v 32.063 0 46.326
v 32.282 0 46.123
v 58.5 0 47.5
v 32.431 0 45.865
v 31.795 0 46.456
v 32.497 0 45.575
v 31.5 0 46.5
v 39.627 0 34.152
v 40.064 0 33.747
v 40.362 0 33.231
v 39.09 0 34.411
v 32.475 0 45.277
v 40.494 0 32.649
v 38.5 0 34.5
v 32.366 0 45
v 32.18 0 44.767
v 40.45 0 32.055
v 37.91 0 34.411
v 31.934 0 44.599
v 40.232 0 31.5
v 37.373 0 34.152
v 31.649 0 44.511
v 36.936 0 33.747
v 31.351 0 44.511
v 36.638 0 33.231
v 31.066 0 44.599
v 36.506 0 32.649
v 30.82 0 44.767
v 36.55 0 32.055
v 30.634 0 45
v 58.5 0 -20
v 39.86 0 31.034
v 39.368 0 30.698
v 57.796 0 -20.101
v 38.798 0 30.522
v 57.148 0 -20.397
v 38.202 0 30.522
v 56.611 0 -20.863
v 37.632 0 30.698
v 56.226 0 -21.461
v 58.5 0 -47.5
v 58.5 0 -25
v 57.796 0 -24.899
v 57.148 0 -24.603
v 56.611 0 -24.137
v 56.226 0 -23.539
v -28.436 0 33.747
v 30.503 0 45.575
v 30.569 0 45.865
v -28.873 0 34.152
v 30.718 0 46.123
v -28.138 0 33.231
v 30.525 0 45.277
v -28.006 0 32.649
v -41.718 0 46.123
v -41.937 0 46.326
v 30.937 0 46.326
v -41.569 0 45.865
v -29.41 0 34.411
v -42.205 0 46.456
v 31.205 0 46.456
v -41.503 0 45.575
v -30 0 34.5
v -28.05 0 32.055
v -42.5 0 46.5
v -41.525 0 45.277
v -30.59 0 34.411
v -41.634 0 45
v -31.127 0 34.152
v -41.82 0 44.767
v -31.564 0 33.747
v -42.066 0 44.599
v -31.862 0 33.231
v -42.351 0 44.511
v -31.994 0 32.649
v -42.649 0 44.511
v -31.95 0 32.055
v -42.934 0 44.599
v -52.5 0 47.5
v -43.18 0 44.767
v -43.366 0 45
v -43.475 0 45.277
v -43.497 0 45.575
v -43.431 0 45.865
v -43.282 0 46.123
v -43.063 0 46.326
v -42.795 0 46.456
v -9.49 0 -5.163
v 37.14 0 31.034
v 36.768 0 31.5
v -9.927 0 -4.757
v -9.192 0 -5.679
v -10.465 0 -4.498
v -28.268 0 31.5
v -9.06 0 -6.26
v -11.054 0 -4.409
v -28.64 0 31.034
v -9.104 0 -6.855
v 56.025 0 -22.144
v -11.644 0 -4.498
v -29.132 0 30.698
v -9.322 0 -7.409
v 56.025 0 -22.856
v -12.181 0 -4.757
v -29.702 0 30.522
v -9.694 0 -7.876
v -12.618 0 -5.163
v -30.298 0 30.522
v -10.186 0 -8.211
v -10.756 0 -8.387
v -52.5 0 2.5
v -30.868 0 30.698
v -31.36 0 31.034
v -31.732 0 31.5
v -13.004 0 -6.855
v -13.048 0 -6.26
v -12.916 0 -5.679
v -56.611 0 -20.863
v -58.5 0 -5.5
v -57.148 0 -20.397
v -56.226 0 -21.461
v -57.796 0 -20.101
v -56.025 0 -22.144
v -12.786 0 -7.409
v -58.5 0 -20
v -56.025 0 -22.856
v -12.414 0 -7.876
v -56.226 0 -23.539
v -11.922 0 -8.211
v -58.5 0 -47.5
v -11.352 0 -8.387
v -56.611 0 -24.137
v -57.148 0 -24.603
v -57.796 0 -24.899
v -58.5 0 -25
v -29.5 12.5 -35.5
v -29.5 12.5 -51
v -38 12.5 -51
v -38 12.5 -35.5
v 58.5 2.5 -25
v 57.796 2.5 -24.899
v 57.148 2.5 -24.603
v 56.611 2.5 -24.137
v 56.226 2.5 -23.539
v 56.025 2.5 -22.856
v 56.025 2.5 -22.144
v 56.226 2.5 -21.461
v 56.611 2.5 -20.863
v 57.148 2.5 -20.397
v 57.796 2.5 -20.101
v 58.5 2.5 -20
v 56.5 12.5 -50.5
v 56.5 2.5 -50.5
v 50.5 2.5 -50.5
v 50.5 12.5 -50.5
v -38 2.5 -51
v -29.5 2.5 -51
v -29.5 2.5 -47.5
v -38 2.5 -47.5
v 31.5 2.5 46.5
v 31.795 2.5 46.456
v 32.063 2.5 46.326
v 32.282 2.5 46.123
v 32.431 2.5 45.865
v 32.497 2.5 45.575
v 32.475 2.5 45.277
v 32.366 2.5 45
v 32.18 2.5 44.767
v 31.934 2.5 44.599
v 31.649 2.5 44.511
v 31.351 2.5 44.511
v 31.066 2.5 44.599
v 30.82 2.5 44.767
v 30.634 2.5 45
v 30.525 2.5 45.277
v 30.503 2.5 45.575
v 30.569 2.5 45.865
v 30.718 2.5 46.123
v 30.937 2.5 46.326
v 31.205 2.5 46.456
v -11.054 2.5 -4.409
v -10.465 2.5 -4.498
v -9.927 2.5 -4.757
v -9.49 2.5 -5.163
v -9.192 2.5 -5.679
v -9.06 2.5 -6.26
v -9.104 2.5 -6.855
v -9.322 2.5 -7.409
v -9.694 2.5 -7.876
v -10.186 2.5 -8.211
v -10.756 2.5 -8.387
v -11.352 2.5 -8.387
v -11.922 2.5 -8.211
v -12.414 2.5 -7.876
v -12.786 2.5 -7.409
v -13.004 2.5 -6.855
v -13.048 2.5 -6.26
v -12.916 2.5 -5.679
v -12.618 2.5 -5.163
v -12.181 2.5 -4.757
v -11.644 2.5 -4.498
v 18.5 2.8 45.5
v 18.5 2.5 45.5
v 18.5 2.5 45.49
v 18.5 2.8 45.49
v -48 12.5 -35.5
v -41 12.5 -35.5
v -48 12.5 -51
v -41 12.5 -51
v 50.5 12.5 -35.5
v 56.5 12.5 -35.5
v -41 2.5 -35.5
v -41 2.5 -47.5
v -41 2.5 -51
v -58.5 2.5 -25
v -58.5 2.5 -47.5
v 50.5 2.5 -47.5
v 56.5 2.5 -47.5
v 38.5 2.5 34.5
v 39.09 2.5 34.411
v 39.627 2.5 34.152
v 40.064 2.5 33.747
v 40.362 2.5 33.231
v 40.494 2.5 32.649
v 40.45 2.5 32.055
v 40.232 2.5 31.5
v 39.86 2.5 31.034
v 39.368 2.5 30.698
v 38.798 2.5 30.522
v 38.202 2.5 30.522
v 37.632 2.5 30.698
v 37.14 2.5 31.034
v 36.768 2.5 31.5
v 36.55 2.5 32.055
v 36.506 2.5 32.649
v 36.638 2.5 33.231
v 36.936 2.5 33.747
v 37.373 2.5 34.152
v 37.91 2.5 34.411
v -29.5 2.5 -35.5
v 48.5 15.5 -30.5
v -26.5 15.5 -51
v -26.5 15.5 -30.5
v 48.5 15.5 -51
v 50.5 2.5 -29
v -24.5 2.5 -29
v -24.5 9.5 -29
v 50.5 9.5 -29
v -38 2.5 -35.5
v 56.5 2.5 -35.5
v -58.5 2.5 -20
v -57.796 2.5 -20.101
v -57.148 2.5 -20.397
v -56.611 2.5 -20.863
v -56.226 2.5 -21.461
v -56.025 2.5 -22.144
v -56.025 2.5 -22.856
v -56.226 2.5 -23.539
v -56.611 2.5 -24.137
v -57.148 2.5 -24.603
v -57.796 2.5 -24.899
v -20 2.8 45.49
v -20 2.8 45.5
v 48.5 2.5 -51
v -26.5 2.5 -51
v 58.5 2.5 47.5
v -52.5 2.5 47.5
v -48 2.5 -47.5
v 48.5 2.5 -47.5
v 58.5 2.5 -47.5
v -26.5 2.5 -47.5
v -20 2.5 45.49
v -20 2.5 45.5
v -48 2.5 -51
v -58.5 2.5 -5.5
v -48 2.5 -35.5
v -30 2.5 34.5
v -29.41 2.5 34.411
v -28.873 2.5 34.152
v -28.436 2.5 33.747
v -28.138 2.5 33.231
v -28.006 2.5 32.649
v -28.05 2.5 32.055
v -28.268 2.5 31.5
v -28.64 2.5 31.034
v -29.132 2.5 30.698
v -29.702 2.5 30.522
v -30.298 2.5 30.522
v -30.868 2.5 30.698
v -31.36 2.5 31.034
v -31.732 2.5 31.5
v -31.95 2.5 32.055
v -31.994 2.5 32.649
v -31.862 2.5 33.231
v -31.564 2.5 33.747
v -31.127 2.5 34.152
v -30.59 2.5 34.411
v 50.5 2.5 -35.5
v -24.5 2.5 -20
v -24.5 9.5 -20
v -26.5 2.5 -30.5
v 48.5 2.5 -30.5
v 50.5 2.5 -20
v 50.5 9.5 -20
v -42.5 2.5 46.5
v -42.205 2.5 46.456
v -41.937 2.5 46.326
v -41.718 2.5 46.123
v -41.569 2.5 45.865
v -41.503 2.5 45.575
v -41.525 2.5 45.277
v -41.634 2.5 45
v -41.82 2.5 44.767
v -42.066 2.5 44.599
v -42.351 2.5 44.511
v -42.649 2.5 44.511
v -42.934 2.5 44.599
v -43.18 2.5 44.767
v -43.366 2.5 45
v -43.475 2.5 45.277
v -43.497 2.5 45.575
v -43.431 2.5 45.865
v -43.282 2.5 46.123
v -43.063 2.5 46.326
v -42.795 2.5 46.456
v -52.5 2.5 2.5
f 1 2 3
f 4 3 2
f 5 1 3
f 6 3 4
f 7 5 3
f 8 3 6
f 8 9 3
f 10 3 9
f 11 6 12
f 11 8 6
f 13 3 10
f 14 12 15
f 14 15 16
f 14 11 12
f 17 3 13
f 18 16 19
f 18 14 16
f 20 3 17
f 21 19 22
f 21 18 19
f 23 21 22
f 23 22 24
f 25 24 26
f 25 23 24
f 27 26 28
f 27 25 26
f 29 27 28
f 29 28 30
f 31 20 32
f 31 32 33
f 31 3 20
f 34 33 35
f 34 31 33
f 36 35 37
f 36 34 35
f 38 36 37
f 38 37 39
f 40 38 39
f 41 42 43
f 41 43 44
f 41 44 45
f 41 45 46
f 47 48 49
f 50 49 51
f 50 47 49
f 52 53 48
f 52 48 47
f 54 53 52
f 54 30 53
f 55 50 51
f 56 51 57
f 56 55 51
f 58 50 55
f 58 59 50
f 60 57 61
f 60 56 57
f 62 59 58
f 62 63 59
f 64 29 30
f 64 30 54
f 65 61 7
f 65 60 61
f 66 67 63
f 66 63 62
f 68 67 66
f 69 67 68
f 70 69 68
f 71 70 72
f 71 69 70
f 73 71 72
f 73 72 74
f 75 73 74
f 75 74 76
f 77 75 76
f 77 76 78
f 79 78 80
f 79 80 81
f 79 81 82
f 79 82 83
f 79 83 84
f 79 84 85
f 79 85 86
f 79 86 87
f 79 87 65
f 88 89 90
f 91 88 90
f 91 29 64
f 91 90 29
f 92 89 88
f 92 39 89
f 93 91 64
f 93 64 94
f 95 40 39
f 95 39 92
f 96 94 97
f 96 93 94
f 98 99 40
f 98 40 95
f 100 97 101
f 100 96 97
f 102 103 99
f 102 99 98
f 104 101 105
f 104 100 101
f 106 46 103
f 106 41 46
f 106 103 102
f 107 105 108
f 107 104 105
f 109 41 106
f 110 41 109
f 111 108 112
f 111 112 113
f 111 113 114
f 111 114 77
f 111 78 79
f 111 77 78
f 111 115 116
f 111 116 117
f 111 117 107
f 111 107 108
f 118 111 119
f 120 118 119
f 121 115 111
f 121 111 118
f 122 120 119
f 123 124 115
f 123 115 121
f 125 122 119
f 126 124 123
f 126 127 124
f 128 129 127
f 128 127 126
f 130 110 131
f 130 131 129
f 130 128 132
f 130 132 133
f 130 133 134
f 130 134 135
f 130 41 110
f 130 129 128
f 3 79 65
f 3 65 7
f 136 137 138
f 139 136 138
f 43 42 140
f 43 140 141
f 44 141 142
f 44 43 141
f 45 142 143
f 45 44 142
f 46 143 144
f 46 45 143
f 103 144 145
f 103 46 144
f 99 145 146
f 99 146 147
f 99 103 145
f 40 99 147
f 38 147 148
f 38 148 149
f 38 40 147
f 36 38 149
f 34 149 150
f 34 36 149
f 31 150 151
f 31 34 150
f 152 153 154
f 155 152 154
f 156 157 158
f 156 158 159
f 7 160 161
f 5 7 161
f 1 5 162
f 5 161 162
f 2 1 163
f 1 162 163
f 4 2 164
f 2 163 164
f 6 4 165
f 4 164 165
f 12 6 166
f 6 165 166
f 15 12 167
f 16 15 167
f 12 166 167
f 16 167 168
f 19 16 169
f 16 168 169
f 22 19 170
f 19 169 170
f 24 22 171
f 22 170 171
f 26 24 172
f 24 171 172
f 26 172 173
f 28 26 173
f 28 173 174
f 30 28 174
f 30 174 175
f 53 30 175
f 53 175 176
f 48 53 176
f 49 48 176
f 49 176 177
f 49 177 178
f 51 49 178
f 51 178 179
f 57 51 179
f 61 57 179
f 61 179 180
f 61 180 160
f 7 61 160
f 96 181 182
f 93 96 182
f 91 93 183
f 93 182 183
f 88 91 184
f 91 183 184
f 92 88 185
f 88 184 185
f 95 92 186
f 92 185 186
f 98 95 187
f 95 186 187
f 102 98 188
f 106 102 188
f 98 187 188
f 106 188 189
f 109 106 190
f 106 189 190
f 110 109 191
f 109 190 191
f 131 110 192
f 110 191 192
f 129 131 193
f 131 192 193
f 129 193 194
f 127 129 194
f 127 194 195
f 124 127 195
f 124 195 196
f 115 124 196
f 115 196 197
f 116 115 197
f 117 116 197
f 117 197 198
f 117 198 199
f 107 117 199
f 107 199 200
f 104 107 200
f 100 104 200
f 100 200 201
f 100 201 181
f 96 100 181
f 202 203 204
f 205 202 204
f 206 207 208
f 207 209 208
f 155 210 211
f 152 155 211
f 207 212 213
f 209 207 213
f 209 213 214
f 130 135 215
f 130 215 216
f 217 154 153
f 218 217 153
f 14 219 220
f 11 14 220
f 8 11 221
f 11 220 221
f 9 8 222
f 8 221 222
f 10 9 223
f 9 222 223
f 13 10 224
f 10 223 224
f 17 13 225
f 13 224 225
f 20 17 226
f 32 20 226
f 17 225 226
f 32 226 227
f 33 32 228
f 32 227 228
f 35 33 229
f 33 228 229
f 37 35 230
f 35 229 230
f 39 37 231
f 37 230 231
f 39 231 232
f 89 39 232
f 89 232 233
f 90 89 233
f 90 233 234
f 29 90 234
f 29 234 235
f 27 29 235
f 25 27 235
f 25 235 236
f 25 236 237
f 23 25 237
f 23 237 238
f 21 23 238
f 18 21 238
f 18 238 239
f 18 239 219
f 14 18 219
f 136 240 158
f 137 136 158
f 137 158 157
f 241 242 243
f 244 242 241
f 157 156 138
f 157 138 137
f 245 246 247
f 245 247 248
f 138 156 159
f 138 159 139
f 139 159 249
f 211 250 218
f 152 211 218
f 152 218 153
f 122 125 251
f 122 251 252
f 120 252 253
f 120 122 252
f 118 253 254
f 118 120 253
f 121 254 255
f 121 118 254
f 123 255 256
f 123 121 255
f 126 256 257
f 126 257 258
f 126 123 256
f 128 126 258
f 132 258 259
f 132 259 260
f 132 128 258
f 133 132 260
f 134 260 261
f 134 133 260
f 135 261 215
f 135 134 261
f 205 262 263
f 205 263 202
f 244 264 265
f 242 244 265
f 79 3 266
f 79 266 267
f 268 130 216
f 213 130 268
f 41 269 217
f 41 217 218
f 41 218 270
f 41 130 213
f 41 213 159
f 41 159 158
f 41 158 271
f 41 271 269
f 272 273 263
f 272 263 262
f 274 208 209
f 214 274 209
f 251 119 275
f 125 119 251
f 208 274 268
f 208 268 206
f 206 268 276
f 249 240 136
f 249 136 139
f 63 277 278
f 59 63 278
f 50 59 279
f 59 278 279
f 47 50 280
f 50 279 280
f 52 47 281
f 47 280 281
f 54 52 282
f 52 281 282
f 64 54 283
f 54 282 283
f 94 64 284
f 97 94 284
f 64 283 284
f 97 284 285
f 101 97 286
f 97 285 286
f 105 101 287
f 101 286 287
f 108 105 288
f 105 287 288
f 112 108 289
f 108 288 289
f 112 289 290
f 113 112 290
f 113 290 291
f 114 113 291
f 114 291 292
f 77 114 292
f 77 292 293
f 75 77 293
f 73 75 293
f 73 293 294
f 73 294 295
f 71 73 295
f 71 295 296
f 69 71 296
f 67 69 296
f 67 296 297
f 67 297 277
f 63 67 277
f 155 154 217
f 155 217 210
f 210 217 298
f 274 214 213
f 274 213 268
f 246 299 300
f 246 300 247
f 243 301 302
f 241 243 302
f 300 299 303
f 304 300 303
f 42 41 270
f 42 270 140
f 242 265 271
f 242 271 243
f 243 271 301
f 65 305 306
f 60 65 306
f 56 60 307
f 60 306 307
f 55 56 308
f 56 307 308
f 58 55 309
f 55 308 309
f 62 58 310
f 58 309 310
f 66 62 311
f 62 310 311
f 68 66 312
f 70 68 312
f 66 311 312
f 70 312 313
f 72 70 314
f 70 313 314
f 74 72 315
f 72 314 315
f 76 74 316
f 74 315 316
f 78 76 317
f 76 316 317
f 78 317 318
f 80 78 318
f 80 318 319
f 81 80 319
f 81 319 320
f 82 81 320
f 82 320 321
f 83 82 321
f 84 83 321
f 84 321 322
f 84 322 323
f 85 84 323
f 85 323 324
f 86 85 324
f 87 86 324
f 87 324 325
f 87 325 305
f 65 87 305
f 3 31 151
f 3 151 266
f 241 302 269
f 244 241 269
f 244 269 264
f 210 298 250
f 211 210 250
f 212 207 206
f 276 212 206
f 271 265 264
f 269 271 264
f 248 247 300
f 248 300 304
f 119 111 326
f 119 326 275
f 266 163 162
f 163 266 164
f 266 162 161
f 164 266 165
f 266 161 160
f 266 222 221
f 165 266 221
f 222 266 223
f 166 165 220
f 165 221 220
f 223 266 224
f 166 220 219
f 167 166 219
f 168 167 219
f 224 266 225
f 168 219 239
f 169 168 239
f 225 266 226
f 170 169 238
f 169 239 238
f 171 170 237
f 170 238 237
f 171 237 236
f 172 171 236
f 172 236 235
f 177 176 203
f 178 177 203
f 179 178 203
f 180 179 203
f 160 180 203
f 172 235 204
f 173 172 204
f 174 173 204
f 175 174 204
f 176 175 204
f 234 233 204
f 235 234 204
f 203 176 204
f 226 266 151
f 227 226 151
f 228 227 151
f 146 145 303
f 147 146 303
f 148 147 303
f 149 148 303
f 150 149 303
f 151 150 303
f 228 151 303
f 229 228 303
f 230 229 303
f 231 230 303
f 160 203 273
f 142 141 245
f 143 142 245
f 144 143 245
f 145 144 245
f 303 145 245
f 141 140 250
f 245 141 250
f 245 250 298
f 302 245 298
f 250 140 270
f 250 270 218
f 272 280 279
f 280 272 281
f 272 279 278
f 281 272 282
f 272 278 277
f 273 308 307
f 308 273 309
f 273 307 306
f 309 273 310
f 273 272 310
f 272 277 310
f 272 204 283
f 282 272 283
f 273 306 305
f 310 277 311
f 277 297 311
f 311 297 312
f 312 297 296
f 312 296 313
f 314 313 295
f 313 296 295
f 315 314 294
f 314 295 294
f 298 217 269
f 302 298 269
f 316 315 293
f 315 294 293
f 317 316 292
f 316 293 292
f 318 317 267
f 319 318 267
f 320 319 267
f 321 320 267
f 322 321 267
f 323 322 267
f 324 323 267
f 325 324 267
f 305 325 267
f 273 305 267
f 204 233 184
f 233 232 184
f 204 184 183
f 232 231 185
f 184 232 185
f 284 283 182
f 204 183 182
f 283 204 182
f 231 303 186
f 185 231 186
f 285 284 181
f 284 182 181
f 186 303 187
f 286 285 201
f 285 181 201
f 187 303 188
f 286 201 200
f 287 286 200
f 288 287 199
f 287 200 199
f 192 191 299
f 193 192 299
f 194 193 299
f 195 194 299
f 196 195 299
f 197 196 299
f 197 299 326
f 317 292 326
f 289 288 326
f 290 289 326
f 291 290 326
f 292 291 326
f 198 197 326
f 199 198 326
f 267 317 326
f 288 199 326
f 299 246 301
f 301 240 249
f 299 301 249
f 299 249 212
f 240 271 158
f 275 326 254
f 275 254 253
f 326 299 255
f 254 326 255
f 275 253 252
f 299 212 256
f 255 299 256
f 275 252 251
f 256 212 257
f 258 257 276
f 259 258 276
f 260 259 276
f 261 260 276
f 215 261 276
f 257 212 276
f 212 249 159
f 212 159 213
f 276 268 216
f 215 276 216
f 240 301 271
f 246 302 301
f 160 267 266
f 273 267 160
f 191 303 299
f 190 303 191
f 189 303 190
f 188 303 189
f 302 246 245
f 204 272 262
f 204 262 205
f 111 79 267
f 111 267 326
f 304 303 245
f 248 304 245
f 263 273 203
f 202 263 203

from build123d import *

# Parameters (mm, degrees)
BOSS_EXTRUDE1_DEPTH = 2.5
SKETCH2_R           = 2
SKETCH2_R_2         = 1
CUT_EXTRUDE1_DEPTH  = 5
BOSS_EXTRUDE2_DEPTH = 13
SKETCH6_W           = 75
SKETCH6_H           = 9
BOSS_EXTRUDE3_DEPTH = 7
BOSS_EXTRUDE4_DEPTH = 10
SKETCH8_W           = 38.5
SKETCH8_H           = 0.01
BOSS_EXTRUDE5_DEPTH = 0.3


with BuildPart() as part:
    # Sketch1 → Boss-Extrude1 (new body)
    with BuildSketch(Plane(origin=(0, 0, 0), x_dir=(1, 0, 0), z_dir=(0, 1, 0))):
        with BuildLine():
            Line((-58.5, 47.5), (58.5, 47.5))
            Line((58.5, 47.5), (58.5, 25))
            ThreePointArc((58.5, 25), (56, 22.5), (58.5, 20))
            Line((58.5, 20), (58.5, -47.5))
            Line((58.5, -47.5), (-52.5, -47.5))
            Line((-52.5, -47.5), (-52.5, -2.5))
            Line((-52.5, -2.5), (-58.5, 5.5))
            Line((-58.5, 5.5), (-58.5, 20))
            ThreePointArc((-58.5, 20), (-56, 22.5), (-58.5, 25))
            Line((-58.5, 25), (-58.5, 47.5))
        make_face()
    extrude(amount=BOSS_EXTRUDE1_DEPTH)

    # Sketch2 → Cut-Extrude1 (cut)
    with BuildSketch(Plane(origin=(0, 2.5, 0), x_dir=(1, 0, 0), z_dir=(0, 1, 0))):
        with Locations(Location((-11.054054054, 6.409494198, 0), (0, 0, 270))):
            Circle(SKETCH2_R)
        with Locations(Location((-30, -32.5, 0), (0, 0, 270))):
            Circle(SKETCH2_R)
        with Locations(Location((38.5, -32.5, 0), (0, 0, 270))):
            Circle(SKETCH2_R)
        with Locations(Location((-42.5, -45.5, 0), (0, 0, 270))):
            Circle(SKETCH2_R_2)
        with Locations(Location((31.5, -45.5, 0), (0, 0, 270))):
            Circle(SKETCH2_R_2)
    extrude(amount=-CUT_EXTRUDE1_DEPTH, mode=Mode.SUBTRACT)

    # Sketch3 → Boss-Extrude2 (add)
    with BuildSketch(Plane(origin=(0, 2.5, 0), x_dir=(1, 0, 0), z_dir=(0, 1, 0))):
        Polygon((-26.5, 47.5), (-26.5, 30.5), (48.5, 30.5), (48.5, 47.5), (48.5, 51), (-26.5, 51), align=None)
    extrude(amount=BOSS_EXTRUDE2_DEPTH)

    # Sketch6 → Boss-Extrude3 (add)
    with BuildSketch(Plane(origin=(0, 2.5, 0), x_dir=(1, 0, 0), z_dir=(0, 1, 0))):
        with Locations((13, 24.5)):
            Rectangle(SKETCH6_W, SKETCH6_H)
    extrude(amount=BOSS_EXTRUDE3_DEPTH)

    # Sketch7 → Boss-Extrude4 (add)
    with BuildSketch(Plane(origin=(0, 2.5, 0), x_dir=(1, 0, 0), z_dir=(0, 1, 0))):
        Polygon((50.5, 47.5), (50.5, 35.5), (56.5, 35.5), (56.5, 47.5), (56.5, 50.5), (50.5, 50.5), align=None)
        Polygon((-29.5, 47.5), (-29.5, 35.5), (-38, 35.5), (-38, 47.5), (-38, 51), (-29.5, 51), align=None)
        Polygon((-41, 35.5), (-48, 35.5), (-48, 47.5), (-48, 51), (-41, 51), (-41, 47.5), align=None)
    extrude(amount=BOSS_EXTRUDE4_DEPTH)

    # Sketch8 → Boss-Extrude5 (add)
    with BuildSketch(Plane(origin=(0, 2.5, 0), x_dir=(1, 0, 0), z_dir=(0, 1, 0))):
        with Locations((-0.75, -45.495)):
            Rectangle(SKETCH8_W, SKETCH8_H)
    extrude(amount=BOSS_EXTRUDE5_DEPTH)


solid = part.part
